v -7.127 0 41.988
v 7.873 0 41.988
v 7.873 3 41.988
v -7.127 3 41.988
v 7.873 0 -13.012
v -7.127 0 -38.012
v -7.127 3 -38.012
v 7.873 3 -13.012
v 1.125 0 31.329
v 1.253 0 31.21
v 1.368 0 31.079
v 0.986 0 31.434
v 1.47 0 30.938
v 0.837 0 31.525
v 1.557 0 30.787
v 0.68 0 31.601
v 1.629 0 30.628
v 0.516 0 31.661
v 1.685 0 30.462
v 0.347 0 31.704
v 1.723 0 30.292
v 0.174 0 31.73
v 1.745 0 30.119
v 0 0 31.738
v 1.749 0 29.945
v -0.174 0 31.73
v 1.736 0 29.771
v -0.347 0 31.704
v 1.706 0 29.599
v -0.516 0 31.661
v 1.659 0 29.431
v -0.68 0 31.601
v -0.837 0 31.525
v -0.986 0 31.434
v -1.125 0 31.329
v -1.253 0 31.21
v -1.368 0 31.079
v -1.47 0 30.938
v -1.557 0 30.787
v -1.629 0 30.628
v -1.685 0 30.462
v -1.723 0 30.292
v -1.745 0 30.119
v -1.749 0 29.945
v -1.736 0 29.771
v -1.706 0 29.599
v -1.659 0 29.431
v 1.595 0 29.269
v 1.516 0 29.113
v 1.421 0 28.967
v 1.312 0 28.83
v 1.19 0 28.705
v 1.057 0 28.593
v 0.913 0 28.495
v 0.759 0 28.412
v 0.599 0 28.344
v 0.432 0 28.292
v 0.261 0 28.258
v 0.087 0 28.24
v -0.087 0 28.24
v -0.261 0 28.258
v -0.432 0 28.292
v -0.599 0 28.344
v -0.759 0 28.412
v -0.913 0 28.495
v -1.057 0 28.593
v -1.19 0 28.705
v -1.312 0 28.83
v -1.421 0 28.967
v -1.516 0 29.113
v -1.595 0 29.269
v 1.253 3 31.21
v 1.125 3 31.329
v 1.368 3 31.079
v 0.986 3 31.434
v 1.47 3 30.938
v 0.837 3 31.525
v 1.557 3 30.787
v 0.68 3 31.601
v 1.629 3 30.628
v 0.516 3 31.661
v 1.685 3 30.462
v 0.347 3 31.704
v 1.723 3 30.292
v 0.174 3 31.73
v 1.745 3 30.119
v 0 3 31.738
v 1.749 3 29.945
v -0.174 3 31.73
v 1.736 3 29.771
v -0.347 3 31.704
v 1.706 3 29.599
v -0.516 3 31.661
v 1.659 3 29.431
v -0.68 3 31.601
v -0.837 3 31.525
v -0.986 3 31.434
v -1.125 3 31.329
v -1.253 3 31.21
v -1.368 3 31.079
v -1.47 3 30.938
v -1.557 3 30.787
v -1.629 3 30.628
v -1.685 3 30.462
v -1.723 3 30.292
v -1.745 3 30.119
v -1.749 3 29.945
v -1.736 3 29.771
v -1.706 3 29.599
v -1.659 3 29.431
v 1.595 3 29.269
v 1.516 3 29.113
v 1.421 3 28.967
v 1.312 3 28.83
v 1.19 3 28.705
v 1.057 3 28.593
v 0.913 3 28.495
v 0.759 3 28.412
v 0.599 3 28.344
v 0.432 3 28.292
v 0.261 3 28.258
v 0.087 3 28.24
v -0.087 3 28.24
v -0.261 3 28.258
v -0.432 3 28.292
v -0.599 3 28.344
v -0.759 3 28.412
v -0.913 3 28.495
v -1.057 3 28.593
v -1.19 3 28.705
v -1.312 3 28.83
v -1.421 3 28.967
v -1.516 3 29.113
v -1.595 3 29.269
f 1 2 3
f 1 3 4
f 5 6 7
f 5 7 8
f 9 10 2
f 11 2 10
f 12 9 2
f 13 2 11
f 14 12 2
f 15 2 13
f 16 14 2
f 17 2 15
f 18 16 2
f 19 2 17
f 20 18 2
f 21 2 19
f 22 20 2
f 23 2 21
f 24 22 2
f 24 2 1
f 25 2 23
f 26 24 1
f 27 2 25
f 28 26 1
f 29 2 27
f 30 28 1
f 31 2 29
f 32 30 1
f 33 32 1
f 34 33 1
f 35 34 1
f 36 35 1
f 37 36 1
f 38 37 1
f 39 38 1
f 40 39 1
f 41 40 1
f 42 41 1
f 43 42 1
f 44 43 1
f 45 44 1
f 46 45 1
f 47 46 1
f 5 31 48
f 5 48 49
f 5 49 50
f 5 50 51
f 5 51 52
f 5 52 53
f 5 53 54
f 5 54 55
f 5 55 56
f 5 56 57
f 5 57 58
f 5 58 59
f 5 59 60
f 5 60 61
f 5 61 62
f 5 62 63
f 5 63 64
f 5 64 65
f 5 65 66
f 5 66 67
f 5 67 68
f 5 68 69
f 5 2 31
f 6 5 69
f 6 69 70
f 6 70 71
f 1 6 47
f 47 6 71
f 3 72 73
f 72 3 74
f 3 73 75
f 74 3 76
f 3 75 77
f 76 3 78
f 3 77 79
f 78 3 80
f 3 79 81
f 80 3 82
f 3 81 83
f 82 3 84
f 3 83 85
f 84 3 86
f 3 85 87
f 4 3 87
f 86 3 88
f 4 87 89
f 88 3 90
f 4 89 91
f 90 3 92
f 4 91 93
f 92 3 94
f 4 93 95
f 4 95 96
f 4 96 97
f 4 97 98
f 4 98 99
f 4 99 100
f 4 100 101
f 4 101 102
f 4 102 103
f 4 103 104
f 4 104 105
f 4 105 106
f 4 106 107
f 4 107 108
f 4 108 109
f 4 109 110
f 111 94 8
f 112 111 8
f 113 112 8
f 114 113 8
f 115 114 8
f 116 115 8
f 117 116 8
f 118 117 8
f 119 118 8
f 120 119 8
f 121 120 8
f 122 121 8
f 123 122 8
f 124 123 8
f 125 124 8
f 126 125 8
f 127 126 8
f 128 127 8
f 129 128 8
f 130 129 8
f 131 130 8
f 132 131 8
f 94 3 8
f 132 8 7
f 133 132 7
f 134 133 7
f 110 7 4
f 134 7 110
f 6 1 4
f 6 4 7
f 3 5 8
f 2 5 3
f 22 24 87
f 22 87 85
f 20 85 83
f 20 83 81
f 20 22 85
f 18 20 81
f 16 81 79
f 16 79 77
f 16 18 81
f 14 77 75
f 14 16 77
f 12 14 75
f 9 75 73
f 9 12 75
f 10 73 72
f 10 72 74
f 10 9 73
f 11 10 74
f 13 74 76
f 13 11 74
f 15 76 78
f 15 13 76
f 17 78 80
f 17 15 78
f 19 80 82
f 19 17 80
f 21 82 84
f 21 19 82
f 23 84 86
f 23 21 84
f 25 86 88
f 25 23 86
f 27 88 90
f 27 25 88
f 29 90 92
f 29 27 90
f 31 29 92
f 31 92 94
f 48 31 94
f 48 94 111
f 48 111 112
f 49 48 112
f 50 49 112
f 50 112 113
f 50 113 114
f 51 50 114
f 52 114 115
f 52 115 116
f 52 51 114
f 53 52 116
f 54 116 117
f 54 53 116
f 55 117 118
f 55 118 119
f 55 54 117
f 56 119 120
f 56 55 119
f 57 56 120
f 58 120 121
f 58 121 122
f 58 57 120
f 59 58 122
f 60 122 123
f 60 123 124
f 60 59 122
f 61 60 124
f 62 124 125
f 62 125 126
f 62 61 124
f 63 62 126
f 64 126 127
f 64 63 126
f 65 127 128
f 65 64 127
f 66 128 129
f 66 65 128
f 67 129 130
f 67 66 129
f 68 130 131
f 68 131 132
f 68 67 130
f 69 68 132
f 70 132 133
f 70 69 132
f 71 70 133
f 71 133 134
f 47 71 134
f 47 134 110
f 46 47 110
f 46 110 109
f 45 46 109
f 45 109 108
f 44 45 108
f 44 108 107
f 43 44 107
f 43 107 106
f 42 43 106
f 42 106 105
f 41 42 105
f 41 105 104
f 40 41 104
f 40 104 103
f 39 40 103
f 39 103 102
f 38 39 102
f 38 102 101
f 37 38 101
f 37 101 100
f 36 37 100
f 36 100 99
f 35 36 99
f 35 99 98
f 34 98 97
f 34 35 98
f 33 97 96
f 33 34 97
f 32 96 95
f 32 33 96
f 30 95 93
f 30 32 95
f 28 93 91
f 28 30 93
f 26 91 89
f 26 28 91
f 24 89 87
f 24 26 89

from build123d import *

# Parameters (mm, degrees)
SKETCH1_R           = 1.75
BOSS_EXTRUDE1_DEPTH = 3


with BuildPart() as part:
    # Sketch1 → Boss-Extrude1 (new body)
    with BuildSketch(Plane(origin=(0, 0, 0), x_dir=(1, 0, 0), z_dir=(0, 1, 0))):
        Polygon((-7.127190332, 38.011681768), (7.872809668, 13.011681768), (7.872809668, -41.988318232), (-7.127190332, -41.988318232), align=None)
        with Locations(Location((0, -29.988318232, 0), (0, 0, 270))):
            Circle(SKETCH1_R, mode=Mode.SUBTRACT)
    extrude(amount=BOSS_EXTRUDE1_DEPTH)


solid = part.part
